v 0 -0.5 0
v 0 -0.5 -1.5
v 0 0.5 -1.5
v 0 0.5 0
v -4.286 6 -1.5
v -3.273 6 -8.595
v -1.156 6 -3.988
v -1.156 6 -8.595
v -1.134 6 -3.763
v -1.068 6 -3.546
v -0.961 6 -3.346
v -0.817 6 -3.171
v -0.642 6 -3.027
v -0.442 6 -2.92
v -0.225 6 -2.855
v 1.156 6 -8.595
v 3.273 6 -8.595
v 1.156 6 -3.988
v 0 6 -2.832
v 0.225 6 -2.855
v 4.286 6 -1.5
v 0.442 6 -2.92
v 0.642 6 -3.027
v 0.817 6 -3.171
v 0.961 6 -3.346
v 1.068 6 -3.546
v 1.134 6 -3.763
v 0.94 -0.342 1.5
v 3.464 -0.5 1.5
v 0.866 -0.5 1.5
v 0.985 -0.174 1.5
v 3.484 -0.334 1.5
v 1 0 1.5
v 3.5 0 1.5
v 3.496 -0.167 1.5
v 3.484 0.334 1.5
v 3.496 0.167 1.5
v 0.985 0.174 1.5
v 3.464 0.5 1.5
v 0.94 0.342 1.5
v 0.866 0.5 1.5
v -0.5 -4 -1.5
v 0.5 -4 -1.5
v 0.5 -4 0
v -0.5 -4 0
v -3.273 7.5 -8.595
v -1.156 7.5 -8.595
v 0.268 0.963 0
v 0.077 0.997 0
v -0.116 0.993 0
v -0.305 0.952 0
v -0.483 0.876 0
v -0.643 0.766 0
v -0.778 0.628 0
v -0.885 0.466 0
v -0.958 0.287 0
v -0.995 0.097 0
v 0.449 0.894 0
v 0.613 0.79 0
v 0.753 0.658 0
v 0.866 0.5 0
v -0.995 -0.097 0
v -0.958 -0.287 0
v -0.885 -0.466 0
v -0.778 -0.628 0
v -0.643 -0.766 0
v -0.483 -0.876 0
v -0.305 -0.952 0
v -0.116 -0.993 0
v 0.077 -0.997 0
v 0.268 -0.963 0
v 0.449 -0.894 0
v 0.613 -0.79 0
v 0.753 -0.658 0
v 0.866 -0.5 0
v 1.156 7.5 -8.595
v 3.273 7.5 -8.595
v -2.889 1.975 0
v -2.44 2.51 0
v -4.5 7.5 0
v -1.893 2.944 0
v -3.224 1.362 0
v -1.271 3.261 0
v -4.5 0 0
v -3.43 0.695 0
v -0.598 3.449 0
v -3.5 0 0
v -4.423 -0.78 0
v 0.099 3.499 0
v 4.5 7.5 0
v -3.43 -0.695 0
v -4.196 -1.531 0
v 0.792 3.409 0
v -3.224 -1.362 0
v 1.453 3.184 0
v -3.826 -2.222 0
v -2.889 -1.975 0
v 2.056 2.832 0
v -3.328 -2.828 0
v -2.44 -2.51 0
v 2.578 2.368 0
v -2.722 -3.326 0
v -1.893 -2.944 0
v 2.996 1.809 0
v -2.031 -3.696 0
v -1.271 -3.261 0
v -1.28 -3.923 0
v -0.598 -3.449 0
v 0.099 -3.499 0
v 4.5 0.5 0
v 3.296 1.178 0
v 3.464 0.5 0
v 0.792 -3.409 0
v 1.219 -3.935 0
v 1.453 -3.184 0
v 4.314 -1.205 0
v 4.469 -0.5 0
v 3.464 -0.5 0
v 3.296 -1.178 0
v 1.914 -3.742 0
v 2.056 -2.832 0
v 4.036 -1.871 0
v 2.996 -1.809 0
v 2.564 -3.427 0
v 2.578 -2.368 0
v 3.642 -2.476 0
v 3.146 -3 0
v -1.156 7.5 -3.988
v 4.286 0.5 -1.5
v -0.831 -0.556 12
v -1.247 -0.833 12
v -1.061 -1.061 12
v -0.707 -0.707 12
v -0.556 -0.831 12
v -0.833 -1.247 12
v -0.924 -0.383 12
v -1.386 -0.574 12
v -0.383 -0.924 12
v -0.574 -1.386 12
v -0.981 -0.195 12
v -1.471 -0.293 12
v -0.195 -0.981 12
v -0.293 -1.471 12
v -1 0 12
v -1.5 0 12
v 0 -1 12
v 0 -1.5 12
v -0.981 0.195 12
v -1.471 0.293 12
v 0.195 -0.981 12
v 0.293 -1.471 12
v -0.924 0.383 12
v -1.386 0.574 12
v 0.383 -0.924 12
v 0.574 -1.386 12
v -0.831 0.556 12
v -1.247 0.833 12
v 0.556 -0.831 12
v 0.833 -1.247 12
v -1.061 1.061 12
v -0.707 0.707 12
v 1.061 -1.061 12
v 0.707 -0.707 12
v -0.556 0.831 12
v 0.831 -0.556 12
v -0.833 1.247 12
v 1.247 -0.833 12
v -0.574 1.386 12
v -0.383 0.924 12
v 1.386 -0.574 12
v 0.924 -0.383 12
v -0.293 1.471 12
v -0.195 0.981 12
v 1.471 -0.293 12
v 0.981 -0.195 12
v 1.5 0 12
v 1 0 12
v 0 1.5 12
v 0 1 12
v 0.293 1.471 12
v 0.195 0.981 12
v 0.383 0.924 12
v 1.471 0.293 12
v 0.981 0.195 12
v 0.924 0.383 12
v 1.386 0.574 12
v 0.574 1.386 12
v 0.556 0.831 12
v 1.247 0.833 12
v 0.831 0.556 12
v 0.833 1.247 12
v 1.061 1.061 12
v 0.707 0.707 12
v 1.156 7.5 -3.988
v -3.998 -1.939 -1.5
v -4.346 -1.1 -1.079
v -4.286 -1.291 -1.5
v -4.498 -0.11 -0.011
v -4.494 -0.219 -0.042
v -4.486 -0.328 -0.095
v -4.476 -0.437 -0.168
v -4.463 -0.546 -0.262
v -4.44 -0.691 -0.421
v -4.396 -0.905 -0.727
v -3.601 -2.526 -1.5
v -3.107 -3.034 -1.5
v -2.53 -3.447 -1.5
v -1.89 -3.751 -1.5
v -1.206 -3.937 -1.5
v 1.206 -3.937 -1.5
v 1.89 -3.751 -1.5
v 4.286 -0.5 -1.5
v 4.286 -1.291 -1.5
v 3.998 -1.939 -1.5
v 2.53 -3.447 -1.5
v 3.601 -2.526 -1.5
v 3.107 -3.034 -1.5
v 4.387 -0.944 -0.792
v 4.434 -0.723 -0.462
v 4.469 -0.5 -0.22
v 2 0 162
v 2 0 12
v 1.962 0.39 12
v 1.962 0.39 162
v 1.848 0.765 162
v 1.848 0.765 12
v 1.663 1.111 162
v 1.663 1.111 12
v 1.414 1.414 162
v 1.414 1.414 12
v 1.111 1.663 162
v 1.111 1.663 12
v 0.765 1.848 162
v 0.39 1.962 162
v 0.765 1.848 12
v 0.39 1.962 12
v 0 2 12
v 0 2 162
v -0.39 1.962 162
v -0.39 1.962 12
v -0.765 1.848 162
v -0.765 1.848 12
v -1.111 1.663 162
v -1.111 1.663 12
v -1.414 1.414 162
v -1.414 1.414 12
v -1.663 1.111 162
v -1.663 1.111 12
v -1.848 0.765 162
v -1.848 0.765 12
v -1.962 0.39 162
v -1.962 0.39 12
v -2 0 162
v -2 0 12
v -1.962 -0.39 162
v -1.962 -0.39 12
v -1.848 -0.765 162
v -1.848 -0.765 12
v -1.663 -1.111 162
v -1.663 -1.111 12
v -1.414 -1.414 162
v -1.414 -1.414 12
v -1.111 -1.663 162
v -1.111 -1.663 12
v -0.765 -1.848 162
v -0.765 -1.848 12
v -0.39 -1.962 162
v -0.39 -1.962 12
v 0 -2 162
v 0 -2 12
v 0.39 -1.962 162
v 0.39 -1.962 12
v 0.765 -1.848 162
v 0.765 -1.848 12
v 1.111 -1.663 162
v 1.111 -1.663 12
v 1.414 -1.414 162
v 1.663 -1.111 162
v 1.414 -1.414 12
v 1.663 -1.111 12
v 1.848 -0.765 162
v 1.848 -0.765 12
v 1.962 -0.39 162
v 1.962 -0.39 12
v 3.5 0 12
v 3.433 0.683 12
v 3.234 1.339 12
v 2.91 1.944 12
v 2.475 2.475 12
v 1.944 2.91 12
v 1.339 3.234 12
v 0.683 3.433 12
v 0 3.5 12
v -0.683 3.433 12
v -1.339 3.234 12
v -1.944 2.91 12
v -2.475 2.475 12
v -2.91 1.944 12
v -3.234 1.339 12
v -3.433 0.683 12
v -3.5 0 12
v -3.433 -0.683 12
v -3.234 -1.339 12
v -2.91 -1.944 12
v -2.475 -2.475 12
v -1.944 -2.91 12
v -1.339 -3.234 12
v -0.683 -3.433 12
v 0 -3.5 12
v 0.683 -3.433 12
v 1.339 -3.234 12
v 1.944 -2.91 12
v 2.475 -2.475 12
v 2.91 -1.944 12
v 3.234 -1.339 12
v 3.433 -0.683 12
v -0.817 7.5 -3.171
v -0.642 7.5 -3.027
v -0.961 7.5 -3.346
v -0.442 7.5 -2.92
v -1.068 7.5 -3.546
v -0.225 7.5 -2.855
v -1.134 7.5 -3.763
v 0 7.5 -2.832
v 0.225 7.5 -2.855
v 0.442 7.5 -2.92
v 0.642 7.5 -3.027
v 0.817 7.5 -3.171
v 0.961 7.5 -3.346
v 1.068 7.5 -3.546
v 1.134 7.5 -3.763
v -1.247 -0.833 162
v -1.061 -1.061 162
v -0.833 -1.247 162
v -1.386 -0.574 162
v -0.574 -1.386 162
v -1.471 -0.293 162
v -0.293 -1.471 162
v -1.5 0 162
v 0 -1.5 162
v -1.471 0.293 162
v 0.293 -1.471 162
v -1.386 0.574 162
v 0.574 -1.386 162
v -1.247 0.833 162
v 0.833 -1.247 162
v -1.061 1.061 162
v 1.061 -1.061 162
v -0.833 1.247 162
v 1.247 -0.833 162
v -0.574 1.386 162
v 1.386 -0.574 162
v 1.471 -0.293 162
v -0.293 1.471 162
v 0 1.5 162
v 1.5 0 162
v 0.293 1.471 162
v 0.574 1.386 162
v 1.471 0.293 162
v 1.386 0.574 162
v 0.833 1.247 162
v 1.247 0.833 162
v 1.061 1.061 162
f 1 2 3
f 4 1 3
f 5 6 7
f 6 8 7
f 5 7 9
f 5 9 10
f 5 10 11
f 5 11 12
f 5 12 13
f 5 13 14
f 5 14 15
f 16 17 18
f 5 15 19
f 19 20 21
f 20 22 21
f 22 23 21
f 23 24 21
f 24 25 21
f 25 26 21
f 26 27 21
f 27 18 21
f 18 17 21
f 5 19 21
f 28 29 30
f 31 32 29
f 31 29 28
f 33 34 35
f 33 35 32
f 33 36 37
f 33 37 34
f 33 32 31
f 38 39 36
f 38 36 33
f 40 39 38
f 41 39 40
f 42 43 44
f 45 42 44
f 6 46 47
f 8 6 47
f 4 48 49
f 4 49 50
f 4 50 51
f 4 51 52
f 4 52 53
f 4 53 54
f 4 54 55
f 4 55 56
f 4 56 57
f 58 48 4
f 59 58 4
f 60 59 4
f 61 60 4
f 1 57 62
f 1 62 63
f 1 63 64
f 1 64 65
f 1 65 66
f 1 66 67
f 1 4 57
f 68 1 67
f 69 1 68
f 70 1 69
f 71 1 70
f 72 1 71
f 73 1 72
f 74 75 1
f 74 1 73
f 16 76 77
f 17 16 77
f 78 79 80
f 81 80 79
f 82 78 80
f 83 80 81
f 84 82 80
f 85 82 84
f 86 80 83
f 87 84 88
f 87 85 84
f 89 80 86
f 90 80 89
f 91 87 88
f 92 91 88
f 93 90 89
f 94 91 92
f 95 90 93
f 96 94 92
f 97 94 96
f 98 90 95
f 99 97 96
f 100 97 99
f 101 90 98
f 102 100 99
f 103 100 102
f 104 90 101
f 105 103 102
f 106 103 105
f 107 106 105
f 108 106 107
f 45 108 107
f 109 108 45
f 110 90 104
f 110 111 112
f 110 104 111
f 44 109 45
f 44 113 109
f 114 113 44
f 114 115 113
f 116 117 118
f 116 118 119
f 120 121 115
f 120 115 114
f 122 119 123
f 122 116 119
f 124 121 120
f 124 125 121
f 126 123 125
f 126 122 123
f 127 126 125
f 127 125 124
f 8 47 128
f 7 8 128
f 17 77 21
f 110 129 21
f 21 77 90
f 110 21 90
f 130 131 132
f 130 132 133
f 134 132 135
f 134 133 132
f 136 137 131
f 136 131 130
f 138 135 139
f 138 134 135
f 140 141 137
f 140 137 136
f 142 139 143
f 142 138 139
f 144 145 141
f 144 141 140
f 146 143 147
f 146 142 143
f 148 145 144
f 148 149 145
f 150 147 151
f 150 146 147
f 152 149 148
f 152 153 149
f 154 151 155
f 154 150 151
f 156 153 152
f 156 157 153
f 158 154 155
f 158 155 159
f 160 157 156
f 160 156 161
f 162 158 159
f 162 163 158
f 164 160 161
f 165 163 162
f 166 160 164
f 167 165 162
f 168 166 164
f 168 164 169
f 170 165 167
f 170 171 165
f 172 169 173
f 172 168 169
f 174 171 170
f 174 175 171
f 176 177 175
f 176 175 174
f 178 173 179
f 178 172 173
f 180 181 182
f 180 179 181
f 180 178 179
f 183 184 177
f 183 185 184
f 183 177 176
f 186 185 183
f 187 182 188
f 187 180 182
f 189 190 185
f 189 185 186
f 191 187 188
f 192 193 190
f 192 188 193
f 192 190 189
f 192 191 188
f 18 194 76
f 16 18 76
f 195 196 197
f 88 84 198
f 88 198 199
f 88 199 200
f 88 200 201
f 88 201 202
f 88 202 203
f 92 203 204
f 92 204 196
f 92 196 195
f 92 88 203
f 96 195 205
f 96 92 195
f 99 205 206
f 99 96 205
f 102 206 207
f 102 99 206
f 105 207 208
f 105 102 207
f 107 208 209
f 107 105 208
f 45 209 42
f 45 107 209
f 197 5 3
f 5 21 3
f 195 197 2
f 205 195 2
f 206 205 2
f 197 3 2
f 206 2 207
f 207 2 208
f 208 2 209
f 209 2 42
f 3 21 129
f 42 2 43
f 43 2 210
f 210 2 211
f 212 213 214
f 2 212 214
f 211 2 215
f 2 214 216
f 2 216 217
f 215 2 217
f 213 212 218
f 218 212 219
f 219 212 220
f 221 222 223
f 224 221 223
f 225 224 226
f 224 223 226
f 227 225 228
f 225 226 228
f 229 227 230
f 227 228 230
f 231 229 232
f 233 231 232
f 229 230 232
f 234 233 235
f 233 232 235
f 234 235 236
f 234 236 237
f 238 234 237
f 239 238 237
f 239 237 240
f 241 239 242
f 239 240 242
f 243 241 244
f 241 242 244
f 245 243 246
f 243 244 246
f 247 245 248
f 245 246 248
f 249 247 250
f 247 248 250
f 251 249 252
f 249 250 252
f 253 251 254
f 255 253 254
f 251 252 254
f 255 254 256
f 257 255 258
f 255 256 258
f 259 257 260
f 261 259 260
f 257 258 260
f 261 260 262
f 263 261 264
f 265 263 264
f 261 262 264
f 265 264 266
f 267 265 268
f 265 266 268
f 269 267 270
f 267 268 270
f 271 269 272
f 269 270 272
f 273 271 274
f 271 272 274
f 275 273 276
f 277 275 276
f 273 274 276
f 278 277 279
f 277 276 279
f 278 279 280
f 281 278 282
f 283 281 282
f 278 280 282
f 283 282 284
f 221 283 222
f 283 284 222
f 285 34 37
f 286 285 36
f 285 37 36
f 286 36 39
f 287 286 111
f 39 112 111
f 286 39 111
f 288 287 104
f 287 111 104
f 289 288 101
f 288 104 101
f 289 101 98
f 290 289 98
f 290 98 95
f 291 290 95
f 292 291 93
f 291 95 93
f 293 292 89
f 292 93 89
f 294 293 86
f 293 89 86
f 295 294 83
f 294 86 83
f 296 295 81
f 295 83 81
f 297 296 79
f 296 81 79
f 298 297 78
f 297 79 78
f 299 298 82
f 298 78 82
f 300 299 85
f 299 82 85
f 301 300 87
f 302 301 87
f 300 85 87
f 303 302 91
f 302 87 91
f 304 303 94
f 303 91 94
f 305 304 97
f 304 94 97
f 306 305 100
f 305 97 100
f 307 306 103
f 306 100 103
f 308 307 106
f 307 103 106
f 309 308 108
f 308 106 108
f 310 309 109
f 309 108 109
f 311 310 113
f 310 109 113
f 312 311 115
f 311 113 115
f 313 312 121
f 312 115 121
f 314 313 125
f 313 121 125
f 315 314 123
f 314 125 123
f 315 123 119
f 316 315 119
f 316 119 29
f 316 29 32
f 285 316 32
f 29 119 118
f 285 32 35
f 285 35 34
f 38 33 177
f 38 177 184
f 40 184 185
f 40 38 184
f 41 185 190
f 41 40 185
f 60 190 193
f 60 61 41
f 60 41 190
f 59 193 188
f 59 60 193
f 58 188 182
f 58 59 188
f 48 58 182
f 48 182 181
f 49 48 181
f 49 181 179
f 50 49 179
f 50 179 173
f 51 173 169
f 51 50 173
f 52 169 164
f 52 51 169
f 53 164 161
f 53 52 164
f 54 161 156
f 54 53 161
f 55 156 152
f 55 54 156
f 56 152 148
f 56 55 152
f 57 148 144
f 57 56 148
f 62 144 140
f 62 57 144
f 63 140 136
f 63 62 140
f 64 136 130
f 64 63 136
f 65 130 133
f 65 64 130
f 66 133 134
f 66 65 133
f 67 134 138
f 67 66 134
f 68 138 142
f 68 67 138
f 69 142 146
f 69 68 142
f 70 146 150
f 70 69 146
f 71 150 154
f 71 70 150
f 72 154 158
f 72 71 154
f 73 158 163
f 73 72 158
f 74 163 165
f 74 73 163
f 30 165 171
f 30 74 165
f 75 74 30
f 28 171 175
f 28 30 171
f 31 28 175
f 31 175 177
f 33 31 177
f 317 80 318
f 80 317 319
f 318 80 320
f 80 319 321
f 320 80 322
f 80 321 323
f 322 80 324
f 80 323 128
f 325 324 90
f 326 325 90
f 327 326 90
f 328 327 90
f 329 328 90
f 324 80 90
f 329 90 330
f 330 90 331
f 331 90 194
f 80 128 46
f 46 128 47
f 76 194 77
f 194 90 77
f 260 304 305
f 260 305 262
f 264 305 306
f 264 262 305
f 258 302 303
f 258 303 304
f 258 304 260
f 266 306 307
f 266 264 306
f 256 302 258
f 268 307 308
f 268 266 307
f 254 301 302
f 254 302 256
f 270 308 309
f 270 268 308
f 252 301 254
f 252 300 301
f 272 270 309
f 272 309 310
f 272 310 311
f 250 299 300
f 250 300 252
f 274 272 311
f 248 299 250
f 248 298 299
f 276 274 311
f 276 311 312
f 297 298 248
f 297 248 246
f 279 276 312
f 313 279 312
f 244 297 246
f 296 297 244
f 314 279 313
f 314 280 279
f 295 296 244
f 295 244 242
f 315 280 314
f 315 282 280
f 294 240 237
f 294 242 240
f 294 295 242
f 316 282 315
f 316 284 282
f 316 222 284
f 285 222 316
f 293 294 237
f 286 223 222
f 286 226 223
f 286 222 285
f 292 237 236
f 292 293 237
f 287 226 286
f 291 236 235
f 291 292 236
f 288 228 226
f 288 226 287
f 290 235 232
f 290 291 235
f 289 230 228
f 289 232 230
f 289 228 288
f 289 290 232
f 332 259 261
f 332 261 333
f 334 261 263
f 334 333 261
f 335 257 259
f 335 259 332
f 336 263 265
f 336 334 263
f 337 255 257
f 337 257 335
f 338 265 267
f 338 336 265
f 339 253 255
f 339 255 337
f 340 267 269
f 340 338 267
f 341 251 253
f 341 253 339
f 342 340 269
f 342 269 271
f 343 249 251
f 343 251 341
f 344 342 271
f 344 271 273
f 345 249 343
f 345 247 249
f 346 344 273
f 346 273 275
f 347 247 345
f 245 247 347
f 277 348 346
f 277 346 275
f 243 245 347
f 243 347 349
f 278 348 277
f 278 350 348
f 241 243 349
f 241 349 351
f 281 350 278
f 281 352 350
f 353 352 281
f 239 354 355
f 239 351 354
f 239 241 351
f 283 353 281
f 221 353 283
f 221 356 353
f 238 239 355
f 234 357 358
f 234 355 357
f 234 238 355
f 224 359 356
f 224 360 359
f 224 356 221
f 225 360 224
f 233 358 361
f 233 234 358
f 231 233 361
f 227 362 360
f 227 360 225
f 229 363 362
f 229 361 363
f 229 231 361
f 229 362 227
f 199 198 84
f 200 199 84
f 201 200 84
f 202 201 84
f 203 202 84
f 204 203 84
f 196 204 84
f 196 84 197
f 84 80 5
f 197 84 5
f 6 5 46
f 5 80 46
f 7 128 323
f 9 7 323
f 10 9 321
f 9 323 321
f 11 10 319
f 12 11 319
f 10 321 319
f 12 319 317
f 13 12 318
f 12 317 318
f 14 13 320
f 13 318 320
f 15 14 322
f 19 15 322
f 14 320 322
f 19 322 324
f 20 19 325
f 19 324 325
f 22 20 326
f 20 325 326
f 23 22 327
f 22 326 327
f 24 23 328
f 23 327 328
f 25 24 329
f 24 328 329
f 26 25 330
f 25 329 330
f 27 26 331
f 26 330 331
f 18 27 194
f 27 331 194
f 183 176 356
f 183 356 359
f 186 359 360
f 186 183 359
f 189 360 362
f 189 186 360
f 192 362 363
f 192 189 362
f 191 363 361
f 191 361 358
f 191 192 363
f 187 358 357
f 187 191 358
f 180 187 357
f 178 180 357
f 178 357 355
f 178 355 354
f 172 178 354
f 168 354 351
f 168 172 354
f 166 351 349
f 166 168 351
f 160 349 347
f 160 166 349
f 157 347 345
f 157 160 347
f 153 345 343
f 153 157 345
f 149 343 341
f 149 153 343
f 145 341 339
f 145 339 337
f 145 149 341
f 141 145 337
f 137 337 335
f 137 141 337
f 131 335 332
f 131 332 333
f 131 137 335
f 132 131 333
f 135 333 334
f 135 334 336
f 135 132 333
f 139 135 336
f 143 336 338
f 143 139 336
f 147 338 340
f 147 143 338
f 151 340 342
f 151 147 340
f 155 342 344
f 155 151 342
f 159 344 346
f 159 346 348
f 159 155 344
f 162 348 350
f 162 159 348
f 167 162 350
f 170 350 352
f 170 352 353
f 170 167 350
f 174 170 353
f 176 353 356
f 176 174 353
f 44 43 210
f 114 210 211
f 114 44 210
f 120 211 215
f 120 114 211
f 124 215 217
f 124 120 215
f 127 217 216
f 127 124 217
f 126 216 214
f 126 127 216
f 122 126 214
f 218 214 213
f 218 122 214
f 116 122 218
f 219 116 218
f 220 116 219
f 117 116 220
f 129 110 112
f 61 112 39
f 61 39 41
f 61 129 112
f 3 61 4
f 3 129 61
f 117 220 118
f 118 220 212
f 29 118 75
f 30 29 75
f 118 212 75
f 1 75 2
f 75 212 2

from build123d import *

# Parameters (mm, degrees)
ESQUISSE1_R             = 3.5
ESQUISSE1_R_2           = 1
BASE_EXTRUSION_DEPTH    = 12
ESQUISSE2_R             = 2
ESQUISSE2_R_2           = 1.5
BOSS_EXTRU_1_DEPTH      = 150
BOSS_EXTRU_2_DEPTH      = 4.5
CONG_1_R                = 4
ESQUISSE4_W             = 7
ESQUISSE4_H             = 1
ENL_V_MAT_EXTRU_1_DEPTH = 3
ENL_V_MAT_EXTRU_2_DEPTH = 12.5


with BuildPart() as part:
    # Esquisse1 → Base-Extrusion (new body)
    with BuildSketch(Plane.XY):
        Circle(ESQUISSE1_R)
        Circle(ESQUISSE1_R_2, mode=Mode.SUBTRACT)
    extrude(amount=BASE_EXTRUSION_DEPTH)

    # Esquisse2 → Boss.-Extru.1 (add)
    with BuildSketch(Plane.XY.offset(12)):
        Circle(ESQUISSE2_R)
        Circle(ESQUISSE2_R_2, mode=Mode.SUBTRACT)
    extrude(amount=BOSS_EXTRU_1_DEPTH)

    # Esquisse3 → Boss.-Extru.2 (add, symmetric)
    with BuildSketch(Plane(origin=(0, 0, 0), x_dir=(0, 0, -1), z_dir=(1, 0, 0))):
        Polygon((0, 0), (0, 7.5), (11.5, 7.5), (11.5, 6), (1.5, 6), (1.5, -4), (0, -4), align=None)
    extrude(amount=BOSS_EXTRU_2_DEPTH, both=True)

    # Congé1
    cong_1_edges = [part.edges().sort_by_distance(p)[0] for p in [
        (4.5, -4, -0.75),
        (-4.5, -4, -0.75),
    ]]
    fillet(cong_1_edges, radius=CONG_1_R)

    # Esquisse4 → Enlèv. mat.-Extru.1 (cut)
    with BuildSketch(Plane(origin=(0, 0, -1.5), x_dir=(-1, 0, 0), z_dir=(0, 0, -1))):
        with Locations((-3.5, 0)):
            Rectangle(ESQUISSE4_W, ESQUISSE4_H)
    extrude(amount=-ENL_V_MAT_EXTRU_1_DEPTH, mode=Mode.SUBTRACT)

    # Esquisse5 → Enlèv. mat.-Extru.2 (cut, through all)
    with BuildSketch(Plane(origin=(0, 7.5, 0), x_dir=(-1, 0, 0), z_dir=(0, 1, 0))):
        with BuildLine():
            Line((1.155842945, -8.594721571), (1.155842945, -3.98824613))
            ThreePointArc((1.155842945, -3.98824613), (0, -2.832403184), (-1.155842945, -3.98824613))
            Line((-1.155842945, -3.98824613), (-1.155842945, -8.594721571))
            Line((-1.155842945, -8.594721571), (-3.272534799, -8.594721571))
            Line((-3.272534799, -8.594721571), (-4.5, 0))
            Line((-4.5, 0), (-6, 0))
            Line((-6, 0), (-6, -13))
            Line((-6, -13), (6, -13))
            Line((6, -13), (6, 0))
            Line((6, 0), (4.5, 0))
            Line((4.5, 0), (3.272534799, -8.594721571))
            Line((3.272534799, -8.594721571), (1.155842945, -8.594721571))
        make_face()
    extrude(amount=-ENL_V_MAT_EXTRU_2_DEPTH, mode=Mode.SUBTRACT)


solid = part.part
